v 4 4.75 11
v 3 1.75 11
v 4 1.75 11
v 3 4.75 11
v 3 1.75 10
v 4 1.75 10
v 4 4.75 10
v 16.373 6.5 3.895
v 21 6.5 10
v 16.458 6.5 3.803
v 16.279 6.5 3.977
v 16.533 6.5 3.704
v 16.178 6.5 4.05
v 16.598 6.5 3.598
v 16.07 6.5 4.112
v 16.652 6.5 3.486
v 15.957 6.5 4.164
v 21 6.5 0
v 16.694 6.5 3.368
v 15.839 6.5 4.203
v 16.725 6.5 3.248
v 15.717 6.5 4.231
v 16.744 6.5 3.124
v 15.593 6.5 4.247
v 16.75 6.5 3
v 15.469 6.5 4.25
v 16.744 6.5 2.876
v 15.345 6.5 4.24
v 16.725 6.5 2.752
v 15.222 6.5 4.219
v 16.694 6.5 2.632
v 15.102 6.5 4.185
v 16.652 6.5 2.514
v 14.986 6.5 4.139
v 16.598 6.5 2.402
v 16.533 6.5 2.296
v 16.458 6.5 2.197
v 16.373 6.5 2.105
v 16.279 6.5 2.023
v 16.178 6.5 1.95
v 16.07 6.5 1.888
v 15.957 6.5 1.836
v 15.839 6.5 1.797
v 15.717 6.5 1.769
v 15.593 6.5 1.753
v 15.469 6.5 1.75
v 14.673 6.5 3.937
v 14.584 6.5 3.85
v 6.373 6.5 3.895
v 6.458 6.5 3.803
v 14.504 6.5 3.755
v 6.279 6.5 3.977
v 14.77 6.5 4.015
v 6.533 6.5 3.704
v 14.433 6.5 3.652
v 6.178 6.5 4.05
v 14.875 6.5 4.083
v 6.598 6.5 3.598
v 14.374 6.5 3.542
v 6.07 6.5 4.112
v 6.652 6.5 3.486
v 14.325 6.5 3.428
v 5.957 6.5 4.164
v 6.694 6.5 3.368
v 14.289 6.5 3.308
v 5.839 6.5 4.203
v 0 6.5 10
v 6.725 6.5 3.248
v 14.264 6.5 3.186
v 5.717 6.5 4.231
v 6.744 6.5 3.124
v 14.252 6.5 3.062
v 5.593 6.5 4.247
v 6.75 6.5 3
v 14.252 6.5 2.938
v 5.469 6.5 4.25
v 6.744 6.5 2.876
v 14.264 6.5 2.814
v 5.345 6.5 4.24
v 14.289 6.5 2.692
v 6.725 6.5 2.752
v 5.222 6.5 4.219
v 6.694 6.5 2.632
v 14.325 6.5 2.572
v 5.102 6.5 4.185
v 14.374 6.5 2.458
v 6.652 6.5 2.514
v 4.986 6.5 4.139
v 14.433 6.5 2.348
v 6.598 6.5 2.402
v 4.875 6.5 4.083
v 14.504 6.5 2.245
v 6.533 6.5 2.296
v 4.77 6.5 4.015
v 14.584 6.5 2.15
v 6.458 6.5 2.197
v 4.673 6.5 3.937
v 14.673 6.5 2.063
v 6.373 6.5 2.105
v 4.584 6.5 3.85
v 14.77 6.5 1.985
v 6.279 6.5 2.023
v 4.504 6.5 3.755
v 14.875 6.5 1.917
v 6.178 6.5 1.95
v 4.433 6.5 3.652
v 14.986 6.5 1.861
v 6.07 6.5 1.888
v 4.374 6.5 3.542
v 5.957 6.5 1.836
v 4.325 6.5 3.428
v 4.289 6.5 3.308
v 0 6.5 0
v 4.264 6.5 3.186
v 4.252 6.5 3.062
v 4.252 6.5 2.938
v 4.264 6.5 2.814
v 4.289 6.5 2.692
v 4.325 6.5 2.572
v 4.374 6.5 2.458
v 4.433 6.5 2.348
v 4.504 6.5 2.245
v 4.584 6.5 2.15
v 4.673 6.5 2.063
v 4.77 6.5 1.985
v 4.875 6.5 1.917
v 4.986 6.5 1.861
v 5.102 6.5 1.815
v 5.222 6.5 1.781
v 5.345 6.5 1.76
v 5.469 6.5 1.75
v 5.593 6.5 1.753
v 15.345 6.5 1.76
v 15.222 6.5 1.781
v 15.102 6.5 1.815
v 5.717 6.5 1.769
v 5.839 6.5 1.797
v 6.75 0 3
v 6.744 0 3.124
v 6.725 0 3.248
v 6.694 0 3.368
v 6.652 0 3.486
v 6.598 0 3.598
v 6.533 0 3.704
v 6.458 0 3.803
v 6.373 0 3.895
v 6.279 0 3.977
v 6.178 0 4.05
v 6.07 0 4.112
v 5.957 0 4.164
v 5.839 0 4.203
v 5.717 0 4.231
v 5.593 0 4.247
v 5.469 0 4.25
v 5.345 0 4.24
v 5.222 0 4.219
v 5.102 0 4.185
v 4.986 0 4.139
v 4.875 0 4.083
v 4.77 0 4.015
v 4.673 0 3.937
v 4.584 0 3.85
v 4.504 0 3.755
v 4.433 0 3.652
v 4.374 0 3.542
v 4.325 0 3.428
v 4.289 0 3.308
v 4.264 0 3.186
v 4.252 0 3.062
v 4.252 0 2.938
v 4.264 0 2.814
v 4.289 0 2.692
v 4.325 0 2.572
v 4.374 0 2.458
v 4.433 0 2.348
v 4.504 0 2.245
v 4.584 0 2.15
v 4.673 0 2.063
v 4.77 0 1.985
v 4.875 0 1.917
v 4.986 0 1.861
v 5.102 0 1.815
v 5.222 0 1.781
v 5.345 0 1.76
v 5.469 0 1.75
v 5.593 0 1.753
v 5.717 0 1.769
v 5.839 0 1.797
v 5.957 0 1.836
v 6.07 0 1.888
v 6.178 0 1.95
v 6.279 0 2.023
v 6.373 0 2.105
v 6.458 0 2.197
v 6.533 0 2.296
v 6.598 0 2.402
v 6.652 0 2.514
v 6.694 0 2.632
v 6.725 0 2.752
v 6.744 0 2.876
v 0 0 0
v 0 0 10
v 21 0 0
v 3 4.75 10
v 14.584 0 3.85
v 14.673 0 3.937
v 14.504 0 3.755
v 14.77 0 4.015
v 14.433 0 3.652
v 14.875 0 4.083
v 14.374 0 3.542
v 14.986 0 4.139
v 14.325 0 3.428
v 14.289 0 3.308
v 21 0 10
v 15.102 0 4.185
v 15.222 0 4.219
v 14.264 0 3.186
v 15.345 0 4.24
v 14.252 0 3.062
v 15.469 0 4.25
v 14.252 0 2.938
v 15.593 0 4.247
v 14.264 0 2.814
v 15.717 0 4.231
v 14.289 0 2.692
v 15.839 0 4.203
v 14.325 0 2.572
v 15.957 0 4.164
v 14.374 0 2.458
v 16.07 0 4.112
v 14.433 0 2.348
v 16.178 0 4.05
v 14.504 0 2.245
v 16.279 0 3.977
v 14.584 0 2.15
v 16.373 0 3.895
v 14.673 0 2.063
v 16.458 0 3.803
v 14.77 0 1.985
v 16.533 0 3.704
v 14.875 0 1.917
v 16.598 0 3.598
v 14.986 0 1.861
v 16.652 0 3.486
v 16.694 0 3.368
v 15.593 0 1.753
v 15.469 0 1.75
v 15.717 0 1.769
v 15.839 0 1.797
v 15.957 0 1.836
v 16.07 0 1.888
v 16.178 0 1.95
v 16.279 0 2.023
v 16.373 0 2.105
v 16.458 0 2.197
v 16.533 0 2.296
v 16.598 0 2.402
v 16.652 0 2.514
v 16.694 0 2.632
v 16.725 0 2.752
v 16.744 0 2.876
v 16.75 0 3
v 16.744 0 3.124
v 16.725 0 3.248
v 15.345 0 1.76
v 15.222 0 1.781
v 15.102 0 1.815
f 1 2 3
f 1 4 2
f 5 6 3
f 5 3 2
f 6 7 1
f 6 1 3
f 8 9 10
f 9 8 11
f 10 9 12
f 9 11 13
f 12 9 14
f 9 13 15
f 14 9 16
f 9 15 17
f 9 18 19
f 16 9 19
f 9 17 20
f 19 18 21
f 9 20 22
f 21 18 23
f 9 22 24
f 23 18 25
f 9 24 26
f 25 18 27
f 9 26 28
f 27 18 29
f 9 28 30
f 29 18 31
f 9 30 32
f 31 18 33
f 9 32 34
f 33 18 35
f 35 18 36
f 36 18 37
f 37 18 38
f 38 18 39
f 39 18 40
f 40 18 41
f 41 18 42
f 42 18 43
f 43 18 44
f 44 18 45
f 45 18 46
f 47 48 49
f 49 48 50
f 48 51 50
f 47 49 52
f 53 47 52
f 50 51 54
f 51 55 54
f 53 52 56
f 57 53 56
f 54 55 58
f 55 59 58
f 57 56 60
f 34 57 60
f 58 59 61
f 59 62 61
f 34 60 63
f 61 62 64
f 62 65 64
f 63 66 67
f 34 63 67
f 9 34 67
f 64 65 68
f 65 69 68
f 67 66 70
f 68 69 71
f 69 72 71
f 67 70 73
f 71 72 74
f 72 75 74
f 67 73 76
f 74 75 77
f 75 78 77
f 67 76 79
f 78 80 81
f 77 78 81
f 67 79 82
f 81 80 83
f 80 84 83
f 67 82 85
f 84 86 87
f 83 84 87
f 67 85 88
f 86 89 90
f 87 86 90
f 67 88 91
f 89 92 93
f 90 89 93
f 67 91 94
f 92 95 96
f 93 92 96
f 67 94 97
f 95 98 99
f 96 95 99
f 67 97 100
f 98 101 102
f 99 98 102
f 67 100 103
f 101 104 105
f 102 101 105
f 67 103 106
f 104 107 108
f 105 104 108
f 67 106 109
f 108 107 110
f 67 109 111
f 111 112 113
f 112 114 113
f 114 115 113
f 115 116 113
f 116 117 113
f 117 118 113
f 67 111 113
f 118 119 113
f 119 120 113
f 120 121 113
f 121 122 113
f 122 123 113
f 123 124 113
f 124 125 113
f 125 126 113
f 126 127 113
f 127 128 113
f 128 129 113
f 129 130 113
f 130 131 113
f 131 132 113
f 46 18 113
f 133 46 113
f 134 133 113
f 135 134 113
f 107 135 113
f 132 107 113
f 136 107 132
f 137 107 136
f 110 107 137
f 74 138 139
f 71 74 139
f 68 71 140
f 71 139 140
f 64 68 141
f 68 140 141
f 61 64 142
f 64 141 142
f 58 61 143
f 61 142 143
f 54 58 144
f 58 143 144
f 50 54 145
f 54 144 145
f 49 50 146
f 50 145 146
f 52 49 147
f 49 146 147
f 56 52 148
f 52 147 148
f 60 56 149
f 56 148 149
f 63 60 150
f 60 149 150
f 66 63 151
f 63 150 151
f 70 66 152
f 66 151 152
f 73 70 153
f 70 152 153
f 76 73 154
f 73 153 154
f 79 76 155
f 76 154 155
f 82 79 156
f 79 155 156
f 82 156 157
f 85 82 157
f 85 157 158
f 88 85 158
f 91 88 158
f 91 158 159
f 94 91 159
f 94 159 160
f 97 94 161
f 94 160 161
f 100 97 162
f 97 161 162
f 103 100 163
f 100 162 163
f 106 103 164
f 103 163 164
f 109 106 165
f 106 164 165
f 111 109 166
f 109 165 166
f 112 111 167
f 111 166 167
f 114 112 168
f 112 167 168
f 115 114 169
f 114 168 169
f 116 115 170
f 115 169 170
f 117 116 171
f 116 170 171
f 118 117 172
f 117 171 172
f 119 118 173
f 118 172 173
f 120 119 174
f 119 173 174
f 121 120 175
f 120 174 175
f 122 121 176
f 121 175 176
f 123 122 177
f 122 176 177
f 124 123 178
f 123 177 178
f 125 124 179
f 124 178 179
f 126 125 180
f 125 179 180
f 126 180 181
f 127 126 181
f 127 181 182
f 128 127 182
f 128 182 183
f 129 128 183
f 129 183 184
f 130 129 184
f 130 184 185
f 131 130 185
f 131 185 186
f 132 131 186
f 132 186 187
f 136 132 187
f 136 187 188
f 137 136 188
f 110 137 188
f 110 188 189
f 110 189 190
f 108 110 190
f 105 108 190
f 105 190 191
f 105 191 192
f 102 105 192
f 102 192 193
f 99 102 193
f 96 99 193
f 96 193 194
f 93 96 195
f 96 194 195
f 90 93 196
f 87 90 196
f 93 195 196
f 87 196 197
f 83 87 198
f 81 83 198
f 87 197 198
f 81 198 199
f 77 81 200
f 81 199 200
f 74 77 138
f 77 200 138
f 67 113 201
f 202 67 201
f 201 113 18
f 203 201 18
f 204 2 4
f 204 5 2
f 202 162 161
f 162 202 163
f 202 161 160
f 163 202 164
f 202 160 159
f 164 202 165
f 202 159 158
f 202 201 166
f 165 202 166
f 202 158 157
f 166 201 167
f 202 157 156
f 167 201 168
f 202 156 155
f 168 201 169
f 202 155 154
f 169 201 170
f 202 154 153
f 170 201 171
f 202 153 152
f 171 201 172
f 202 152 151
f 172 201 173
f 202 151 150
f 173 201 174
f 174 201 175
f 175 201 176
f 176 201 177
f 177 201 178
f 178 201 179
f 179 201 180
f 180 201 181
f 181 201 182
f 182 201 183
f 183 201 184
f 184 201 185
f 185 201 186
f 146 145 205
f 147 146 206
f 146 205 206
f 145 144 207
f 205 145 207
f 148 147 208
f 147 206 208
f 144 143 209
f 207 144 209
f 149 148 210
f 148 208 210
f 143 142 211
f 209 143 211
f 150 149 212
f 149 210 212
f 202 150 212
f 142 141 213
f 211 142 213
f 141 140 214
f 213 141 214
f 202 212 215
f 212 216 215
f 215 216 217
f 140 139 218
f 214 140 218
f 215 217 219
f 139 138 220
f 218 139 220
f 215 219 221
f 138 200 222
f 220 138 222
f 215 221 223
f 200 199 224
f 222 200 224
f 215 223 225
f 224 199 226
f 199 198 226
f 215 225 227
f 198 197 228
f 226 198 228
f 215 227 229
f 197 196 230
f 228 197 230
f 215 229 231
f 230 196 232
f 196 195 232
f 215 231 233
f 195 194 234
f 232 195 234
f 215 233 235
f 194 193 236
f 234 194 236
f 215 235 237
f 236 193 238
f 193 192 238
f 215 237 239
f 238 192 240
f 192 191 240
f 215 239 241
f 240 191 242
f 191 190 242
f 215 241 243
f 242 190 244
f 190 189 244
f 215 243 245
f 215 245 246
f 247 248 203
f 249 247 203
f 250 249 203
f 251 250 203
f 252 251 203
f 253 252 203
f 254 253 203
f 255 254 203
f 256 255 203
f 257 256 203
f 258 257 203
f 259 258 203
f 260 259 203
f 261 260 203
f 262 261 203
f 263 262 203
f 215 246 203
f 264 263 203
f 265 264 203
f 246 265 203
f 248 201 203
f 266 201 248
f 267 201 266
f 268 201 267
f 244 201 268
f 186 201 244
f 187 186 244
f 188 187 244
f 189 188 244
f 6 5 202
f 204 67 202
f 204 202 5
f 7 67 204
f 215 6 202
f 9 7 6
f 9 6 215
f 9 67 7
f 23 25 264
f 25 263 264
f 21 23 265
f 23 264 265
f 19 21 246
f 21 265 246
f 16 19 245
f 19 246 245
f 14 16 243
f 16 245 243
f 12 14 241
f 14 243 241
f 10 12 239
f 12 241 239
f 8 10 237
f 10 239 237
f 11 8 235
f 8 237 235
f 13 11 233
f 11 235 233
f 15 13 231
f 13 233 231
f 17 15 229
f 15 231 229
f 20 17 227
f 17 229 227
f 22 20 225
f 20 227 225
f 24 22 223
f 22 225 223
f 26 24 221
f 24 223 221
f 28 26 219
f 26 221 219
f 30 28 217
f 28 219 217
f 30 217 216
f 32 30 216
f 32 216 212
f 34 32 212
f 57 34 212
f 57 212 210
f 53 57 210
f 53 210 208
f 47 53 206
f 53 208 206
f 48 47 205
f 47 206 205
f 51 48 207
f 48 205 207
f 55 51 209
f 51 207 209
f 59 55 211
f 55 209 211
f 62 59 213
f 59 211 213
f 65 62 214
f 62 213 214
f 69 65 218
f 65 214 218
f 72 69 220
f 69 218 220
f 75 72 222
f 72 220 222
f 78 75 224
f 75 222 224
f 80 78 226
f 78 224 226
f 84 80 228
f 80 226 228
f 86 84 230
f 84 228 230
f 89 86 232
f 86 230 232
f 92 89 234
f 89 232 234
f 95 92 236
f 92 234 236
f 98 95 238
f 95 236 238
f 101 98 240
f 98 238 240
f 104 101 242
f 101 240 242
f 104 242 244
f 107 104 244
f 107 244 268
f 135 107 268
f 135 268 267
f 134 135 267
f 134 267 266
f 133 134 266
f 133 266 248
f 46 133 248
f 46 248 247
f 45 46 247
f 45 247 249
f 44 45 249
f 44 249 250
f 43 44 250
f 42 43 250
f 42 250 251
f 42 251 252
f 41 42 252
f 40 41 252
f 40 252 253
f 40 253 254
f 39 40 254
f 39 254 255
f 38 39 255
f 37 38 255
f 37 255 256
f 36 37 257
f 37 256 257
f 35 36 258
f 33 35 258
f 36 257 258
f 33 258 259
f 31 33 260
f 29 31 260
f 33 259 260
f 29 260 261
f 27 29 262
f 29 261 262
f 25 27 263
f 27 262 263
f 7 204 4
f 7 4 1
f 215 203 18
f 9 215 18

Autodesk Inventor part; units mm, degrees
ref_plane "YZ Plane" through (0, 0, 0) normal (1, 0, 0) x (0, 1, 0)
ref_plane "XZ Plane" through (0, 0, 0) normal (0, 1, 0) x (-1, 0, 0)
ref_plane "XY Plane" through (0, 0, 0) normal (0, 0, 1) x (1, 0, 0)
sketch "Sketch1" plane through (0, 0, 0) normal (0, 0, 1) x (1, 0, 0)
  line L0 (0, 0) -> (21, 0)
  line L1 (21, 0) -> (21, 6.5)
  line L2 (21, 6.5) -> (0, 6.5)
  line L3 (0, 6.5) -> (0, 0)
  dimension "d0" = 21
  dimension "d1" = 6.5
extrude "Extrusion1" add sketch "Sketch1" along normal blind 10
sketch "Sketch2" plane through (0, 0, 10) normal (0, 0, 1) x (1, 0, 0)
  line L0 (3, 4.75) -> (4, 4.75)
  line L1 (4, 4.75) -> (4, 1.75)
  line L2 (4, 1.75) -> (3, 1.75)
  line L3 (3, 1.75) -> (3, 4.75)
  line L4 (0, 6.5) -> (0, 0) projected
  point P0 (3, 3.25)
  point P1 (0, 3.25)
  dimension "d4" = 1
  dimension "d5" = 3
  dimension "d6" = 3
extrude "Extrusion2" add sketch "Sketch2" along normal blind 1
sketch "Sketch3" plane through (0, 0, 0) normal (0, -1, 0) x (1, 0, 0)
  circle A0 centre (5.5, 3) radius 1.25
  circle A1 centre (15.5, 3) radius 1.25
  line L0 (5.5, 3) -> (15.5, 3) construction
  line L1 (0, 0) -> (21, 0) construction
  point P0 (10.5, 3)
  point P1 (10.5, 0)
  dimension "d9" = 2.5
  dimension "d10" = 2.5
  dimension "d11" = 3
  dimension "d12" = 10
extrude "Extrusion3" cut sketch "Sketch3" against normal through all
properties part number "relay"
